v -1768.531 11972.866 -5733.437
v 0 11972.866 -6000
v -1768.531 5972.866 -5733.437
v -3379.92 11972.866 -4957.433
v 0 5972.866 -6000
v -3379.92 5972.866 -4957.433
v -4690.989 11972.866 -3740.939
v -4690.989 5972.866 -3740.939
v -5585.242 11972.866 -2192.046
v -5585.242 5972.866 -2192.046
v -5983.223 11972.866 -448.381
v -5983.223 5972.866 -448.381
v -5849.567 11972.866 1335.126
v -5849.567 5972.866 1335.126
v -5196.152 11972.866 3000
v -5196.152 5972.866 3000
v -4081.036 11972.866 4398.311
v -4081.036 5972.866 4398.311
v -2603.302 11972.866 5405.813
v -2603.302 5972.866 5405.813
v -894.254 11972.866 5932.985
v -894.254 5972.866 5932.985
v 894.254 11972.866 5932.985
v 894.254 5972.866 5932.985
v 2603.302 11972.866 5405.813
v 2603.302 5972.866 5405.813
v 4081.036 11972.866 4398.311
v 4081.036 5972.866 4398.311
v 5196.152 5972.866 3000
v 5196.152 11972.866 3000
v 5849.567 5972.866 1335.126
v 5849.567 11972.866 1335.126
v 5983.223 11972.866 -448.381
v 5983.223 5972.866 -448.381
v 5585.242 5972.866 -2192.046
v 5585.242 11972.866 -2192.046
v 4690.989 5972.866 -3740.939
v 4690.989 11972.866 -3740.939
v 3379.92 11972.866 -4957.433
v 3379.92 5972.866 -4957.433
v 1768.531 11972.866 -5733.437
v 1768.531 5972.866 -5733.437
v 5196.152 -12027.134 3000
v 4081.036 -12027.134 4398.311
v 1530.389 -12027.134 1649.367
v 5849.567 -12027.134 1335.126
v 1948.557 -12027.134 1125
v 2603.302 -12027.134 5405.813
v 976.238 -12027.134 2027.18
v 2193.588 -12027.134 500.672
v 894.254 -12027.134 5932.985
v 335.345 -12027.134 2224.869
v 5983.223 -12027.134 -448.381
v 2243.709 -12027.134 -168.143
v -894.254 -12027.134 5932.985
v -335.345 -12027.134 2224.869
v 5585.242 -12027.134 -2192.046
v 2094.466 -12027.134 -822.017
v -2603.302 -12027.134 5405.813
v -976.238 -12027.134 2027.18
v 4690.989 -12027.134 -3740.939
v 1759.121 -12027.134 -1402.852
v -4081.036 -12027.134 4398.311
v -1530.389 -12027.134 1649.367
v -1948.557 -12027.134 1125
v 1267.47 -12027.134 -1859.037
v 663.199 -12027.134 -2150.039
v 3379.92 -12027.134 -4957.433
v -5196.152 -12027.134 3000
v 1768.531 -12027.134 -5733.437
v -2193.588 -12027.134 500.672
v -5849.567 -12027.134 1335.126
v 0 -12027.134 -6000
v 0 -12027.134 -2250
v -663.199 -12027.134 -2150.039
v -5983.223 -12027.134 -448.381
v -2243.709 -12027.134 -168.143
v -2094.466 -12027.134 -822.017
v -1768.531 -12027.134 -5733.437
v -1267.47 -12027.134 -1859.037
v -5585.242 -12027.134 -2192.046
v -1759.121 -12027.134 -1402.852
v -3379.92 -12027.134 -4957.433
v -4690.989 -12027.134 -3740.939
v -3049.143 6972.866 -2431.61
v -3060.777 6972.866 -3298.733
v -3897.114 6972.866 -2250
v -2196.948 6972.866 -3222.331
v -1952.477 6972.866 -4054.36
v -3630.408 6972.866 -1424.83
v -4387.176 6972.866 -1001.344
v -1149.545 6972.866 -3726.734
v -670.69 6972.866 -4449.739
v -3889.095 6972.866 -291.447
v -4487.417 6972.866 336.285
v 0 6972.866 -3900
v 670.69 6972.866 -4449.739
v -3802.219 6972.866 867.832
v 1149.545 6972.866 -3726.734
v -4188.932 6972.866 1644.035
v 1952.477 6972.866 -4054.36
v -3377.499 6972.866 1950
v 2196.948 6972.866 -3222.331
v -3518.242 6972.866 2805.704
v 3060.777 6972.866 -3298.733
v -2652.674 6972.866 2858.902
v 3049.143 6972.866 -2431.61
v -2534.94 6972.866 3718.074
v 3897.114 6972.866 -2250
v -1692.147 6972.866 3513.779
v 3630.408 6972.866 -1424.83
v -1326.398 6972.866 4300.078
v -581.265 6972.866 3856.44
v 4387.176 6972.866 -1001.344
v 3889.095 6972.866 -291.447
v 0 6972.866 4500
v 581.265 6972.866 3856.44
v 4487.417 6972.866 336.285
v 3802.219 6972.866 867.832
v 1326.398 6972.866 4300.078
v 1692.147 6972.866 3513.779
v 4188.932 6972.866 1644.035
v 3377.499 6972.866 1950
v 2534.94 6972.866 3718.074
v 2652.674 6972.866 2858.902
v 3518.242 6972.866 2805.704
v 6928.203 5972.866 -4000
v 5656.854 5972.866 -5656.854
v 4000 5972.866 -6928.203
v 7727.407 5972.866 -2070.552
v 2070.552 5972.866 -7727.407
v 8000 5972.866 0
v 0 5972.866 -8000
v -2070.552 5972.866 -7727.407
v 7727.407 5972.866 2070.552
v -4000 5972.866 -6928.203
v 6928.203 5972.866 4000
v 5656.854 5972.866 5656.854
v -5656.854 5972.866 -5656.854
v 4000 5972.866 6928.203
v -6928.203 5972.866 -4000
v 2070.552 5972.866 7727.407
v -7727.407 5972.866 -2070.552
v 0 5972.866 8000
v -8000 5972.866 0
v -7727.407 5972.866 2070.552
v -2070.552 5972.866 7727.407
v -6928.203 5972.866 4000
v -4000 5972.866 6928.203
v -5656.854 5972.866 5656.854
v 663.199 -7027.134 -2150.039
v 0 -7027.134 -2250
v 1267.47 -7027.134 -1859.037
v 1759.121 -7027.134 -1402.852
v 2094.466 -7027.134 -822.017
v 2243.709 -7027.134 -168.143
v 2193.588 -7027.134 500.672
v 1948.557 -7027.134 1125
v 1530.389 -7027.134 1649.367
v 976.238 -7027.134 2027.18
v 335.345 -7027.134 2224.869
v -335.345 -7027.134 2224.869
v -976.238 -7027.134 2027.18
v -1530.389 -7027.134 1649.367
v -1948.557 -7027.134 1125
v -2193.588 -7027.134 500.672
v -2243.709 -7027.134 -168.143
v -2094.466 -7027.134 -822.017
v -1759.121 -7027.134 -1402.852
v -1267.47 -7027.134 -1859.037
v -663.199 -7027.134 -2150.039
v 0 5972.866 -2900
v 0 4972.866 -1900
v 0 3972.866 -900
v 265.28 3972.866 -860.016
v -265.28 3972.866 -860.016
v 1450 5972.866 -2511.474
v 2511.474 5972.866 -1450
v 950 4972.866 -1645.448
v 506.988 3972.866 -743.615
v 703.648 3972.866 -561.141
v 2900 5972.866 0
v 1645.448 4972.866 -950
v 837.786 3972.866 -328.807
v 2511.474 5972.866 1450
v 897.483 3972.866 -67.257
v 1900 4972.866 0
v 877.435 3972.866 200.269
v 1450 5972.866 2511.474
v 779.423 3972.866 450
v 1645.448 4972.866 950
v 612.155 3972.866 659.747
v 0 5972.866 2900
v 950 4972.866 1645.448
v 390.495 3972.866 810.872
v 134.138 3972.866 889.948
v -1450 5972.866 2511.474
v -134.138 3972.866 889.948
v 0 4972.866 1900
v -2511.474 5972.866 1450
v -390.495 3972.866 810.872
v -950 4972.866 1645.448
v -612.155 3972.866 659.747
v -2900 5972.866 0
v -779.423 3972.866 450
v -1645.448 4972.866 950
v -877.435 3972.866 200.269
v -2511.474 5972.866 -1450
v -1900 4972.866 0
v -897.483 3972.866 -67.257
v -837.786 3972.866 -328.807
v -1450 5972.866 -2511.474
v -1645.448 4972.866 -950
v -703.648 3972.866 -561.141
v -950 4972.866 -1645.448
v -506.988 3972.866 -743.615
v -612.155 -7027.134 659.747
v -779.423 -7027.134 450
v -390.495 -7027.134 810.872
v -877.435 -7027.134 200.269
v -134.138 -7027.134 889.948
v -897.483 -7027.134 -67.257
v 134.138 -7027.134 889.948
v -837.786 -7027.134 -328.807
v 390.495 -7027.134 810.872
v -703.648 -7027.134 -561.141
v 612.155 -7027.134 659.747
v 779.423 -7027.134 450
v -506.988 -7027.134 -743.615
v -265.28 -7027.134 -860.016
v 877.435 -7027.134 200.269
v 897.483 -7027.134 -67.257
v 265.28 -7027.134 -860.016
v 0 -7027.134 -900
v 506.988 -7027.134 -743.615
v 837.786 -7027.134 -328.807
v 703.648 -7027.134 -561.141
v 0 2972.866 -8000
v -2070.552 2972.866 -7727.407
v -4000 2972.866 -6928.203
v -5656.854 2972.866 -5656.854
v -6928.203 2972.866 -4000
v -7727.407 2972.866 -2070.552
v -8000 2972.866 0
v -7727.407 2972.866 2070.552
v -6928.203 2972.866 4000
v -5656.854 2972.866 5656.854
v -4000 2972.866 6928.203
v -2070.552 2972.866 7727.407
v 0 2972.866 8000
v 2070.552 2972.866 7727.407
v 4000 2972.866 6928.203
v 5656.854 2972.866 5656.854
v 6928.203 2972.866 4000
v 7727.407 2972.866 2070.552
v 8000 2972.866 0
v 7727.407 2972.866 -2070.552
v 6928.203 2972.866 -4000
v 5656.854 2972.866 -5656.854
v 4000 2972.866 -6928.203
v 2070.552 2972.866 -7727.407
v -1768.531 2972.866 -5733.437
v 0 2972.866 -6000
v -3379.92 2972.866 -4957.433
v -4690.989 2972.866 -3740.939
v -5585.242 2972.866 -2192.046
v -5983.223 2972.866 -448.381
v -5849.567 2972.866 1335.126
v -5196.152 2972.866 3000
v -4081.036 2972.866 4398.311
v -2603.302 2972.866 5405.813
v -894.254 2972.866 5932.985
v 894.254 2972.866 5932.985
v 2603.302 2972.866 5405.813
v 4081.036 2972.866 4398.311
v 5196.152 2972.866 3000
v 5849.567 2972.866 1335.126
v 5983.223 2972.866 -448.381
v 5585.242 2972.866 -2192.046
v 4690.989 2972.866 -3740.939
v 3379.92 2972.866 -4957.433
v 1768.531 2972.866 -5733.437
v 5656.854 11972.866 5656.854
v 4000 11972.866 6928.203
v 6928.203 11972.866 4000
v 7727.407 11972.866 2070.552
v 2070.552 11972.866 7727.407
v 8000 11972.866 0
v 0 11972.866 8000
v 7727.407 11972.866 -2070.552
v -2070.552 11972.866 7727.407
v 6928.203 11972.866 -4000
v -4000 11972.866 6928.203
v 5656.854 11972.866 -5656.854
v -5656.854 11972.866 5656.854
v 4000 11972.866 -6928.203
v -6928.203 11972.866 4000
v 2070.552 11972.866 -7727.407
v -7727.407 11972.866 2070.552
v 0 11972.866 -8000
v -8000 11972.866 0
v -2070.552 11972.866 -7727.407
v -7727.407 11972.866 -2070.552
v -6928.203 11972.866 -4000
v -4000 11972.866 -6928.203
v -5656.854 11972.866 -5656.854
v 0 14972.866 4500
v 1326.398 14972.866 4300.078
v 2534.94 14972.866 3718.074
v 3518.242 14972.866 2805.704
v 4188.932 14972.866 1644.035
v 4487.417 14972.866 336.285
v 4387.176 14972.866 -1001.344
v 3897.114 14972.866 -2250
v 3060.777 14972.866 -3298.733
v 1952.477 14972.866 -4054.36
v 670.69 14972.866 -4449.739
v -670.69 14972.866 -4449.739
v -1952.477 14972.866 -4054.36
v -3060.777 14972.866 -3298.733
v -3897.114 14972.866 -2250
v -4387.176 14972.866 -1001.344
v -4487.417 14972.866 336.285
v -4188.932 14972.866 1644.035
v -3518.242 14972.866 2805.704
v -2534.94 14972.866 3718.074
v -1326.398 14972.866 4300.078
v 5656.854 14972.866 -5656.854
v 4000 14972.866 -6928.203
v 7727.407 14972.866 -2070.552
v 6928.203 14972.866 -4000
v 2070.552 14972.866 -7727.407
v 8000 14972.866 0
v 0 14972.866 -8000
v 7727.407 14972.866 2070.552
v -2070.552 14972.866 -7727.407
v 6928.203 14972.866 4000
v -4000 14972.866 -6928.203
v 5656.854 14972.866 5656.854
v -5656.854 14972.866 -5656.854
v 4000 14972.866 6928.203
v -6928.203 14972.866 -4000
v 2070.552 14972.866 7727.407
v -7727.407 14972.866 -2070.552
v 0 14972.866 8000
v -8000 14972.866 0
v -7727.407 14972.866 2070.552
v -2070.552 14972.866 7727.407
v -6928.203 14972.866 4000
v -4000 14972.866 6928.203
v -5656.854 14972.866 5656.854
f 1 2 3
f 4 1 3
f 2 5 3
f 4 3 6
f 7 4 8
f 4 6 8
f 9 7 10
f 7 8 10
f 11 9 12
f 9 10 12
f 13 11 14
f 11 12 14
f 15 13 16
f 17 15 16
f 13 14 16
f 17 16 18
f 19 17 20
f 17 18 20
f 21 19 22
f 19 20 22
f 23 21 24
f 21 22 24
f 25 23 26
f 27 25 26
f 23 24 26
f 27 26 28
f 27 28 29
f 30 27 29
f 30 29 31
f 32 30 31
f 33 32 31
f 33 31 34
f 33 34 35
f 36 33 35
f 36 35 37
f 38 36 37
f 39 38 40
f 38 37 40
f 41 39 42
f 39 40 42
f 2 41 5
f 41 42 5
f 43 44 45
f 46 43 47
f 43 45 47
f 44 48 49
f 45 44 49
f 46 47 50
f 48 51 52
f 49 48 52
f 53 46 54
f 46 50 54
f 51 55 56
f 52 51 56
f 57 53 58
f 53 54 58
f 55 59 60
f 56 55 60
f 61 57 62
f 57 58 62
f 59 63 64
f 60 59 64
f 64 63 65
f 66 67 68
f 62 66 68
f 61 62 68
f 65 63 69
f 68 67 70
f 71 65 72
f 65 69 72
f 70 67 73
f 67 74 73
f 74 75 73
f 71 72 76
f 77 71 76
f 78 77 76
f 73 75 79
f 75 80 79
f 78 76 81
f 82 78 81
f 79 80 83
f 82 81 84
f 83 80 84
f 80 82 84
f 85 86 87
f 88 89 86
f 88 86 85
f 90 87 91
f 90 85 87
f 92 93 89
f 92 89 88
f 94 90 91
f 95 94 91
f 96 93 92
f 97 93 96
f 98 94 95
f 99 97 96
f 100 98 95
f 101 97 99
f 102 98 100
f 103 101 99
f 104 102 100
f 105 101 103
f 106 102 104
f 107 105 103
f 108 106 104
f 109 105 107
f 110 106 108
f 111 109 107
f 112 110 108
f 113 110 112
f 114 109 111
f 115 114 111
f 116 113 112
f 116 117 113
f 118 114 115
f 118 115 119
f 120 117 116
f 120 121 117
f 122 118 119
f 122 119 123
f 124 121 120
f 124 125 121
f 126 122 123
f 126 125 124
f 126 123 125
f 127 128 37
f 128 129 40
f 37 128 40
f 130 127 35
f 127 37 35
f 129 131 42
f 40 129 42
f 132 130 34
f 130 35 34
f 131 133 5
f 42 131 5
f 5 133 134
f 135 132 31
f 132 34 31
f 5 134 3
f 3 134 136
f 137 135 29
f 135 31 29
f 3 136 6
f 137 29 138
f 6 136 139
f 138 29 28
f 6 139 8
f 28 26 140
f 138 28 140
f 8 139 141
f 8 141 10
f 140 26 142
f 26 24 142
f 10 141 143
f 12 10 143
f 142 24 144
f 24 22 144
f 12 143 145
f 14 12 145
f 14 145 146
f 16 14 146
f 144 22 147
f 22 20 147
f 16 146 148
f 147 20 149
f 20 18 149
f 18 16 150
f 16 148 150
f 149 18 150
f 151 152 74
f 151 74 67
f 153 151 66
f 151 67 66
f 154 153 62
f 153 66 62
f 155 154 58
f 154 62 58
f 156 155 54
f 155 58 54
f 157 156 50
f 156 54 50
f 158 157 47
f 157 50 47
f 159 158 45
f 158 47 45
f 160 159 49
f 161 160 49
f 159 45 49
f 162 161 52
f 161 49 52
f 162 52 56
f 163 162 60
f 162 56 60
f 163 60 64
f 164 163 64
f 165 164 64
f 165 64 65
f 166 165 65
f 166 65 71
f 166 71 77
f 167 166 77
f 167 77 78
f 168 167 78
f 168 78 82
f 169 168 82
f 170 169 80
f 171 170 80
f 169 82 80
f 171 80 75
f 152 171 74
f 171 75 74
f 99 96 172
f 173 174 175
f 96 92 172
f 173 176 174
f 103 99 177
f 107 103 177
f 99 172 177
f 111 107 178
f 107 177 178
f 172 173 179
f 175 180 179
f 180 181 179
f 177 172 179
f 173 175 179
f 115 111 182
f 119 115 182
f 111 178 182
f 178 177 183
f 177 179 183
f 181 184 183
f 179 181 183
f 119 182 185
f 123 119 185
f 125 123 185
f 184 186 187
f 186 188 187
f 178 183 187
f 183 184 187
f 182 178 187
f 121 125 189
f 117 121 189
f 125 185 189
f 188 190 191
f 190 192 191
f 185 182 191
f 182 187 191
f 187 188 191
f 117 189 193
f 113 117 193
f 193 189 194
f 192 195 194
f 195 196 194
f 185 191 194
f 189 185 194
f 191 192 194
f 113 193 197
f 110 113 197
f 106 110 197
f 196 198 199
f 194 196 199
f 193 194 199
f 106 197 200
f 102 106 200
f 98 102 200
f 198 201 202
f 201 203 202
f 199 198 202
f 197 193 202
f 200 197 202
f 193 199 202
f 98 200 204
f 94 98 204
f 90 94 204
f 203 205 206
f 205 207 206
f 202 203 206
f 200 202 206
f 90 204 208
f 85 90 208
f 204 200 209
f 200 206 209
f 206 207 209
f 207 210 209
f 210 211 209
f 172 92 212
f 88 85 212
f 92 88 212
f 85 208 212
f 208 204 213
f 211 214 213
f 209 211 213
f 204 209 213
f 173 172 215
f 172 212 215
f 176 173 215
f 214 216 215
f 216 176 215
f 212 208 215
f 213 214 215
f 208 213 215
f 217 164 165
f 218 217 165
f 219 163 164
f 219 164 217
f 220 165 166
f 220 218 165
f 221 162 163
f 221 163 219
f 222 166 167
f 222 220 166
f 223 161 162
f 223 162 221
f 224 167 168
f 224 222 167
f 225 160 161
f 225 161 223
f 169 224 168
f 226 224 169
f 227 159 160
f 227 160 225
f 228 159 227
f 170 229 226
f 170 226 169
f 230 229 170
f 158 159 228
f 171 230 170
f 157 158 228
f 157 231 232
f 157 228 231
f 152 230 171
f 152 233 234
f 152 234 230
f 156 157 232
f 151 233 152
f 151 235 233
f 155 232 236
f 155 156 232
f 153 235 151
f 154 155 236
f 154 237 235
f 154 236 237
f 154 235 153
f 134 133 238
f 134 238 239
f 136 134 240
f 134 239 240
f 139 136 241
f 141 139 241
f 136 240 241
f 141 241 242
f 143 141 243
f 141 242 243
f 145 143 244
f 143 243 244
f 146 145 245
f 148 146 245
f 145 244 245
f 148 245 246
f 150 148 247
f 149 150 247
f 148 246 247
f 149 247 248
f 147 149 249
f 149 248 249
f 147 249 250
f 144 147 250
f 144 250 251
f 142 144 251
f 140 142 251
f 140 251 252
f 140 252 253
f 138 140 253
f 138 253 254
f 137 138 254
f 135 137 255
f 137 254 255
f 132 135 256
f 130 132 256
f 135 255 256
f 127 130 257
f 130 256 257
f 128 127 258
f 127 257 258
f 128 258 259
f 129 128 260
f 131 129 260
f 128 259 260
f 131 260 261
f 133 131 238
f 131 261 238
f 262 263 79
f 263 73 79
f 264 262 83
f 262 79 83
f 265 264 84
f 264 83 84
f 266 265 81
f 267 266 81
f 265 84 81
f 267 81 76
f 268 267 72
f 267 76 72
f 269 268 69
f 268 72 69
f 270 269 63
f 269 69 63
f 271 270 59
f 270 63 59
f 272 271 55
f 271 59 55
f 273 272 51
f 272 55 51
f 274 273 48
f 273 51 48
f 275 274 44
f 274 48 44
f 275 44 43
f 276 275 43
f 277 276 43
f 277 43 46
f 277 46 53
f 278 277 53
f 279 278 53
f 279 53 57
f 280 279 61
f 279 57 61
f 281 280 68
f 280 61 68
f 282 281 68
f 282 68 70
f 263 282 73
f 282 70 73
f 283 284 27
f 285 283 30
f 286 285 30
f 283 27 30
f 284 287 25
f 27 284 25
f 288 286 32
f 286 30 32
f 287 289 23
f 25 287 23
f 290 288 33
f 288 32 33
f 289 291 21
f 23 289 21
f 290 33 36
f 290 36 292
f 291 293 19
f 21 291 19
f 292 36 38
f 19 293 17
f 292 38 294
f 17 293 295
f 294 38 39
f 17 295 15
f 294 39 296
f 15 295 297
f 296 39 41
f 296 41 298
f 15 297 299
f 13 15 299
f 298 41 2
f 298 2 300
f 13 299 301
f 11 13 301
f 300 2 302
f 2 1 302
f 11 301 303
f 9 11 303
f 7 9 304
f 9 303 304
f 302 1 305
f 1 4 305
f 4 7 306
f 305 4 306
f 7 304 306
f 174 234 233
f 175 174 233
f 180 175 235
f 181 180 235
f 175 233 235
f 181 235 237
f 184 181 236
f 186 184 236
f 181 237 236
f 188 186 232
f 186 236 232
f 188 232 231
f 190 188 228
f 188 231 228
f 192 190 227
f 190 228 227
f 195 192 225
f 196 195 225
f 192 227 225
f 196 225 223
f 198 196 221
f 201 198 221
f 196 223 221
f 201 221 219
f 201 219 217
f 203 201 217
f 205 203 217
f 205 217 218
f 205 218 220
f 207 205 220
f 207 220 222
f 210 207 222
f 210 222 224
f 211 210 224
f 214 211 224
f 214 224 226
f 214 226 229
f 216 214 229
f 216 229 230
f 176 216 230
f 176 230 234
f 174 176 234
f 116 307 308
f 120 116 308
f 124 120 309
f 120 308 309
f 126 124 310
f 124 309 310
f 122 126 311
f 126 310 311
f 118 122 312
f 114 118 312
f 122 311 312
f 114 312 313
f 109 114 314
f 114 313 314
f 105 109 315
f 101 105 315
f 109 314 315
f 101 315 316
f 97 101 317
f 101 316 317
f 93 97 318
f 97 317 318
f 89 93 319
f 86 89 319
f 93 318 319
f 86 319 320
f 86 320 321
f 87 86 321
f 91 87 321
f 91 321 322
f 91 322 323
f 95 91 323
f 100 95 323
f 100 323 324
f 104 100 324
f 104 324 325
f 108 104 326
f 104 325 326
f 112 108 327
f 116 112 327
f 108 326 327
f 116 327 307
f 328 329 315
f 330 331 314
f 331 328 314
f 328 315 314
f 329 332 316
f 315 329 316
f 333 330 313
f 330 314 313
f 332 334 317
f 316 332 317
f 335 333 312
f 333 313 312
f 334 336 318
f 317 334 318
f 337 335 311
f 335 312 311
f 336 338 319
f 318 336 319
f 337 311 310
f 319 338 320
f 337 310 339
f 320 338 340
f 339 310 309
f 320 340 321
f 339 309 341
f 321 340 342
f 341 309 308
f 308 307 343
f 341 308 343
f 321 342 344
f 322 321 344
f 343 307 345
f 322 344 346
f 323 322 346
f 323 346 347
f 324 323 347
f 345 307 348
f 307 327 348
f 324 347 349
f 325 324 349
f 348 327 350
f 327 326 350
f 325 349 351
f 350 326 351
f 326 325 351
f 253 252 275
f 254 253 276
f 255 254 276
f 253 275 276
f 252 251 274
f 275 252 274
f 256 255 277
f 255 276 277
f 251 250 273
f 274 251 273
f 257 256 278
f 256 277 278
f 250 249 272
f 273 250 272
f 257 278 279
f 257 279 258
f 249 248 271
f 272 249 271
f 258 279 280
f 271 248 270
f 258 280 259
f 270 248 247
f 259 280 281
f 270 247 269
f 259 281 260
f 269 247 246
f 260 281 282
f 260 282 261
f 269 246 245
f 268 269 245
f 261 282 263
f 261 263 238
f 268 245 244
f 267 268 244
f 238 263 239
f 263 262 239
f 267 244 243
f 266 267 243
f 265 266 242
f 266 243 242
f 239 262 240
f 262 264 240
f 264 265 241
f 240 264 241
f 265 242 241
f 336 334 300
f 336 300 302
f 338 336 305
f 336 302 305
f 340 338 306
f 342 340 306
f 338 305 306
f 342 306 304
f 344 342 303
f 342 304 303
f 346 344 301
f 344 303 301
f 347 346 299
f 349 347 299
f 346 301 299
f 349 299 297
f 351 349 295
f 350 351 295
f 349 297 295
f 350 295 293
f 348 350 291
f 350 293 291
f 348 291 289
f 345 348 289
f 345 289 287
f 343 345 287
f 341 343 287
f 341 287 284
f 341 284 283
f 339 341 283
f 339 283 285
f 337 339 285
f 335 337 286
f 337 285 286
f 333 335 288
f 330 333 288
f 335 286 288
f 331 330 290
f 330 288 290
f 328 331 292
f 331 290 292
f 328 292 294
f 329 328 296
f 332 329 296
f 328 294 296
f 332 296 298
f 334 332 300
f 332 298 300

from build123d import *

# Parameters (mm, degrees)
SKETCH_2_R          = 2250
SKETCH_2_R_2        = 900
CUT_EXTRUDE_1_DEPTH = 5000
SKETCH_3_R          = 900
CUT_EXTRUDE_3_DEPTH = 29275.562336609
SKETCH_4_R          = 4500
CUT_EXTRUDE_4_DEPTH = 8000
CHAMFER_1_SIZE      = 3000


with BuildPart() as part:
    # 草圖1 → 旋轉1 (revolve)
    with BuildSketch(Plane.XY, mode=Mode.PRIVATE) as revolve_1_sk:
        Polygon((0, 0), (0, 14972.865629195), (-8000, 14972.865629195), (-8000, 11972.865629195), (-6000, 11972.865629195), (-6000, 5972.865629195), (-8000, 5972.865629195), (-8000, 2972.865629195), (-6000, 2972.865629195), (-6000, -12027.134370805), (0, -12027.134370805), align=None)
    revolve(revolve_1_sk.sketch.rotate(Axis((0, 0, 0), (0, 1, 0)), 270), axis=Axis((0, 0, 0), (0, 1, 0)))

    # 草圖2 → 除料-伸長1 (cut)
    with BuildSketch(Plane.XZ.offset(12027.134370805)):
        with Locations(Location((0, 0, 0), (0, 0, 270))):
            Circle(SKETCH_2_R)
        with Locations(Location((0, 0, 0), (0, 0, 270))):
            Circle(SKETCH_2_R_2, mode=Mode.SUBTRACT)
    extrude(amount=-CUT_EXTRUDE_1_DEPTH, mode=Mode.SUBTRACT)

    # 草圖3 → 除料-伸長3 (cut, through all)
    with BuildSketch(Plane.XZ.offset(12027.134370805)):
        with Locations(Location((0, 0, 0), (0, 0, 270))):
            Circle(SKETCH_3_R)
    extrude(amount=-CUT_EXTRUDE_3_DEPTH, mode=Mode.SUBTRACT)

    # 草圖4 → 除料-伸長4 (cut)
    with BuildSketch(Plane(origin=(0, 14972.865629195, 0), x_dir=(1, 0, 0), z_dir=(0, 1, 0))):
        with Locations(Location((0, 0, 0), (0, 0, 270))):
            Circle(SKETCH_4_R)
    extrude(amount=-CUT_EXTRUDE_4_DEPTH, mode=Mode.SUBTRACT)

    # 導角1
    chamfer_1_edges = [part.edges().sort_by_distance(p)[0] for p in [
        (0, 6972.865629195, 900),
    ]]
    chamfer(chamfer_1_edges, length=CHAMFER_1_SIZE)


solid = part.part
